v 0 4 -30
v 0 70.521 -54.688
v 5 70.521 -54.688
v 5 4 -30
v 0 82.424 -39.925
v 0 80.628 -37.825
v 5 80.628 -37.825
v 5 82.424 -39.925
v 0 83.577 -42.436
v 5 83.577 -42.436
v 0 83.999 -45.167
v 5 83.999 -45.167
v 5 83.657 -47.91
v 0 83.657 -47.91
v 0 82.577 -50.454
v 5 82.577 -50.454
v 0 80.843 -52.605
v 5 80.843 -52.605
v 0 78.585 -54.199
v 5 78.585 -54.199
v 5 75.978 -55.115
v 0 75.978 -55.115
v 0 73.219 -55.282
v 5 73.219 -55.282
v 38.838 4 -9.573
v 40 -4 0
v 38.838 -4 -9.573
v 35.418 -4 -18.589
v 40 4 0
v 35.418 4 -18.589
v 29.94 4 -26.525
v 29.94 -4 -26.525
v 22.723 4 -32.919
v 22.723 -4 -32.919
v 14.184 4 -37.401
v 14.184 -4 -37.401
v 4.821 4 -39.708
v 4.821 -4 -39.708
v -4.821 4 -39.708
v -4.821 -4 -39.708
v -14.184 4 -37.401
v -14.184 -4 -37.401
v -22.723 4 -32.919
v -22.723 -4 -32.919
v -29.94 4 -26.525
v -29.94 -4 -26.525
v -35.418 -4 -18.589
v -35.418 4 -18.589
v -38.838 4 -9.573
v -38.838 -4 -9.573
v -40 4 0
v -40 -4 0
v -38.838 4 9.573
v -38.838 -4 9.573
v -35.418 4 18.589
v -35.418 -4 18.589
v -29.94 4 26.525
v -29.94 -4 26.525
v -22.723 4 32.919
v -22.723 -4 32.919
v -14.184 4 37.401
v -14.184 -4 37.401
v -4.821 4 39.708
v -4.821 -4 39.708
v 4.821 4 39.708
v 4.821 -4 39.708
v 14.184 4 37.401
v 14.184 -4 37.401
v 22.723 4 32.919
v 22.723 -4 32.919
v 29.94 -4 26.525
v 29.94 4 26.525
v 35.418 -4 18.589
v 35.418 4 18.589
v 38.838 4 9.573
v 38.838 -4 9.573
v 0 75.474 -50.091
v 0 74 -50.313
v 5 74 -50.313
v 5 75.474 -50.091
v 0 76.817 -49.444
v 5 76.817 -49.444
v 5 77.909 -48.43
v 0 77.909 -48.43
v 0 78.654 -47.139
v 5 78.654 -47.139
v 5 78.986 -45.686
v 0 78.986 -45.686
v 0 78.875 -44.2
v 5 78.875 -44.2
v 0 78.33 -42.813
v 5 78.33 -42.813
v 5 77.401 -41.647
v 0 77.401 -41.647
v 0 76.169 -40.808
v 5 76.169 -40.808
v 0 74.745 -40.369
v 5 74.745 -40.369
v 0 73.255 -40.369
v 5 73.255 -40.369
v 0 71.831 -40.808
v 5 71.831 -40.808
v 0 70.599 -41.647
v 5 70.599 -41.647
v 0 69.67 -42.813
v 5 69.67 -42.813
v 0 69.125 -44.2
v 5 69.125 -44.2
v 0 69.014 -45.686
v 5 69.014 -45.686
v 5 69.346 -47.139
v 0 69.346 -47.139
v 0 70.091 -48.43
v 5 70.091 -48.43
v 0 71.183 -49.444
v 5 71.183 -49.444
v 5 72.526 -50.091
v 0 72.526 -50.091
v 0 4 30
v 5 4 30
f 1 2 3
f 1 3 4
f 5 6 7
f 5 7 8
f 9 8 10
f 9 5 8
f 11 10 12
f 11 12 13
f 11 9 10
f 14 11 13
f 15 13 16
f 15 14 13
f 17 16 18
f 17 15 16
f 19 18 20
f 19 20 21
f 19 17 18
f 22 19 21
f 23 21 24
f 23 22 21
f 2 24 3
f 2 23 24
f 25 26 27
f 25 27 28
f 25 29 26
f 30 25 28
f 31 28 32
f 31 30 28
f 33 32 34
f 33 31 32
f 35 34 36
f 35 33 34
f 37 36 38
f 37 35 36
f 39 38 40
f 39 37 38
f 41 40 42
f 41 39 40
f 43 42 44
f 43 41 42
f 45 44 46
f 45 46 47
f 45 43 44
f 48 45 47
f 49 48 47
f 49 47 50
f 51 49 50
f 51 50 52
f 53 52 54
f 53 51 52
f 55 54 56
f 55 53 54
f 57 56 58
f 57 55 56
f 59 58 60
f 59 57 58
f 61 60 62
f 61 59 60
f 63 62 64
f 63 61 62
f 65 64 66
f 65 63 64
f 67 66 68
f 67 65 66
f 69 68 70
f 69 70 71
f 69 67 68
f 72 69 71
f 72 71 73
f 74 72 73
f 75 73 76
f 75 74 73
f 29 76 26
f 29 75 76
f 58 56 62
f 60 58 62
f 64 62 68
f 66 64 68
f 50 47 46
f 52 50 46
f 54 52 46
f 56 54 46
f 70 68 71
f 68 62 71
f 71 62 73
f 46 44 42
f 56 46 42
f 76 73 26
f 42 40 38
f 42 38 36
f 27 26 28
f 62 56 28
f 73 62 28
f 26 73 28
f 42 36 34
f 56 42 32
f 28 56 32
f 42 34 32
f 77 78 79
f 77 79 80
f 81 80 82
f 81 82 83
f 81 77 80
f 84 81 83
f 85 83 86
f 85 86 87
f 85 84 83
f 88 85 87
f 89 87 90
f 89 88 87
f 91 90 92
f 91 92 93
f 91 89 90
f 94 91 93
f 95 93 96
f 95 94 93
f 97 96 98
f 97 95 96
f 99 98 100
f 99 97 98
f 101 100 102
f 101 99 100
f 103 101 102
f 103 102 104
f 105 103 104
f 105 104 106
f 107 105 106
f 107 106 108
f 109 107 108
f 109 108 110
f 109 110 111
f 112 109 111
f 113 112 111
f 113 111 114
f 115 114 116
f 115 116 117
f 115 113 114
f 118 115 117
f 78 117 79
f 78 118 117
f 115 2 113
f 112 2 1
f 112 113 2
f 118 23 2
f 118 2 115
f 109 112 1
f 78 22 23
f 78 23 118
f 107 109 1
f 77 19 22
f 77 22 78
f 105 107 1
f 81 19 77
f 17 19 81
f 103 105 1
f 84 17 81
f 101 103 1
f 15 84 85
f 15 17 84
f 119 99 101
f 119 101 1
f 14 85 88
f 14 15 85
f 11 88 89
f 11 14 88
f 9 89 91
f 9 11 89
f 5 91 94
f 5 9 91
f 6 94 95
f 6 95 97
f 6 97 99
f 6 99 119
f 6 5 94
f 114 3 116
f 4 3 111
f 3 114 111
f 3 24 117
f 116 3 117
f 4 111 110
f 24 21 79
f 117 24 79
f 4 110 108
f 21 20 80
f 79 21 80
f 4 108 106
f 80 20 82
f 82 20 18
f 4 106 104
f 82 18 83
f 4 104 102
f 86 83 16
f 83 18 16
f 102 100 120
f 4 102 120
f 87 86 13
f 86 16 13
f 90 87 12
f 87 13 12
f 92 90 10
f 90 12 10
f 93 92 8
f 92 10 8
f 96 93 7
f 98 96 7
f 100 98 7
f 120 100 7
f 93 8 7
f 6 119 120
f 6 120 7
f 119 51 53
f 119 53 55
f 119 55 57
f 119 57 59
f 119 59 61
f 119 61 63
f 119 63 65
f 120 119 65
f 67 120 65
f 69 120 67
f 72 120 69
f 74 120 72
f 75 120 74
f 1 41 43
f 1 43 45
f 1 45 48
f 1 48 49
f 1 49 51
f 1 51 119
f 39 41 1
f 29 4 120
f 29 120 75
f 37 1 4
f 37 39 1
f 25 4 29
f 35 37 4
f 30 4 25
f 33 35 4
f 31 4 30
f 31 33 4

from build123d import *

# Parameters (mm, degrees)
SKETCH1_R           = 40
BOSS_EXTRUDE1_DEPTH = 4
SKETCH8_R           = 5
BOSS_EXTRUDE3_DEPTH = 5


with BuildPart() as part:
    # Sketch1 → Boss-Extrude1 (new body, symmetric)
    with BuildSketch(Plane(origin=(0, 0, 0), x_dir=(1, 0, 0), z_dir=(0, 1, 0))):
        Circle(SKETCH1_R)
    extrude(amount=BOSS_EXTRUDE1_DEPTH, both=True)

    # Sketch8 → Boss-Extrude3 (add)
    with BuildSketch(Plane(origin=(0, 0, 0), x_dir=(0, 0, -1), z_dir=(1, 0, 0))):
        with BuildLine():
            Line((0, 4), (-30, 4))
            Line((-30, 4), (37.824592442, 80.62784488))
            ThreePointArc((37.824592442, 80.62784488), (50.453649811, 82.577329326), (54.687857205, 70.520585679))
            Line((54.687857205, 70.520585679), (30, 4))
            Line((30, 4), (0, 4))
        make_face()
        with Locations((45.312694487, 74)):
            Circle(SKETCH8_R, mode=Mode.SUBTRACT)
    extrude(amount=BOSS_EXTRUDE3_DEPTH)


solid = part.part
